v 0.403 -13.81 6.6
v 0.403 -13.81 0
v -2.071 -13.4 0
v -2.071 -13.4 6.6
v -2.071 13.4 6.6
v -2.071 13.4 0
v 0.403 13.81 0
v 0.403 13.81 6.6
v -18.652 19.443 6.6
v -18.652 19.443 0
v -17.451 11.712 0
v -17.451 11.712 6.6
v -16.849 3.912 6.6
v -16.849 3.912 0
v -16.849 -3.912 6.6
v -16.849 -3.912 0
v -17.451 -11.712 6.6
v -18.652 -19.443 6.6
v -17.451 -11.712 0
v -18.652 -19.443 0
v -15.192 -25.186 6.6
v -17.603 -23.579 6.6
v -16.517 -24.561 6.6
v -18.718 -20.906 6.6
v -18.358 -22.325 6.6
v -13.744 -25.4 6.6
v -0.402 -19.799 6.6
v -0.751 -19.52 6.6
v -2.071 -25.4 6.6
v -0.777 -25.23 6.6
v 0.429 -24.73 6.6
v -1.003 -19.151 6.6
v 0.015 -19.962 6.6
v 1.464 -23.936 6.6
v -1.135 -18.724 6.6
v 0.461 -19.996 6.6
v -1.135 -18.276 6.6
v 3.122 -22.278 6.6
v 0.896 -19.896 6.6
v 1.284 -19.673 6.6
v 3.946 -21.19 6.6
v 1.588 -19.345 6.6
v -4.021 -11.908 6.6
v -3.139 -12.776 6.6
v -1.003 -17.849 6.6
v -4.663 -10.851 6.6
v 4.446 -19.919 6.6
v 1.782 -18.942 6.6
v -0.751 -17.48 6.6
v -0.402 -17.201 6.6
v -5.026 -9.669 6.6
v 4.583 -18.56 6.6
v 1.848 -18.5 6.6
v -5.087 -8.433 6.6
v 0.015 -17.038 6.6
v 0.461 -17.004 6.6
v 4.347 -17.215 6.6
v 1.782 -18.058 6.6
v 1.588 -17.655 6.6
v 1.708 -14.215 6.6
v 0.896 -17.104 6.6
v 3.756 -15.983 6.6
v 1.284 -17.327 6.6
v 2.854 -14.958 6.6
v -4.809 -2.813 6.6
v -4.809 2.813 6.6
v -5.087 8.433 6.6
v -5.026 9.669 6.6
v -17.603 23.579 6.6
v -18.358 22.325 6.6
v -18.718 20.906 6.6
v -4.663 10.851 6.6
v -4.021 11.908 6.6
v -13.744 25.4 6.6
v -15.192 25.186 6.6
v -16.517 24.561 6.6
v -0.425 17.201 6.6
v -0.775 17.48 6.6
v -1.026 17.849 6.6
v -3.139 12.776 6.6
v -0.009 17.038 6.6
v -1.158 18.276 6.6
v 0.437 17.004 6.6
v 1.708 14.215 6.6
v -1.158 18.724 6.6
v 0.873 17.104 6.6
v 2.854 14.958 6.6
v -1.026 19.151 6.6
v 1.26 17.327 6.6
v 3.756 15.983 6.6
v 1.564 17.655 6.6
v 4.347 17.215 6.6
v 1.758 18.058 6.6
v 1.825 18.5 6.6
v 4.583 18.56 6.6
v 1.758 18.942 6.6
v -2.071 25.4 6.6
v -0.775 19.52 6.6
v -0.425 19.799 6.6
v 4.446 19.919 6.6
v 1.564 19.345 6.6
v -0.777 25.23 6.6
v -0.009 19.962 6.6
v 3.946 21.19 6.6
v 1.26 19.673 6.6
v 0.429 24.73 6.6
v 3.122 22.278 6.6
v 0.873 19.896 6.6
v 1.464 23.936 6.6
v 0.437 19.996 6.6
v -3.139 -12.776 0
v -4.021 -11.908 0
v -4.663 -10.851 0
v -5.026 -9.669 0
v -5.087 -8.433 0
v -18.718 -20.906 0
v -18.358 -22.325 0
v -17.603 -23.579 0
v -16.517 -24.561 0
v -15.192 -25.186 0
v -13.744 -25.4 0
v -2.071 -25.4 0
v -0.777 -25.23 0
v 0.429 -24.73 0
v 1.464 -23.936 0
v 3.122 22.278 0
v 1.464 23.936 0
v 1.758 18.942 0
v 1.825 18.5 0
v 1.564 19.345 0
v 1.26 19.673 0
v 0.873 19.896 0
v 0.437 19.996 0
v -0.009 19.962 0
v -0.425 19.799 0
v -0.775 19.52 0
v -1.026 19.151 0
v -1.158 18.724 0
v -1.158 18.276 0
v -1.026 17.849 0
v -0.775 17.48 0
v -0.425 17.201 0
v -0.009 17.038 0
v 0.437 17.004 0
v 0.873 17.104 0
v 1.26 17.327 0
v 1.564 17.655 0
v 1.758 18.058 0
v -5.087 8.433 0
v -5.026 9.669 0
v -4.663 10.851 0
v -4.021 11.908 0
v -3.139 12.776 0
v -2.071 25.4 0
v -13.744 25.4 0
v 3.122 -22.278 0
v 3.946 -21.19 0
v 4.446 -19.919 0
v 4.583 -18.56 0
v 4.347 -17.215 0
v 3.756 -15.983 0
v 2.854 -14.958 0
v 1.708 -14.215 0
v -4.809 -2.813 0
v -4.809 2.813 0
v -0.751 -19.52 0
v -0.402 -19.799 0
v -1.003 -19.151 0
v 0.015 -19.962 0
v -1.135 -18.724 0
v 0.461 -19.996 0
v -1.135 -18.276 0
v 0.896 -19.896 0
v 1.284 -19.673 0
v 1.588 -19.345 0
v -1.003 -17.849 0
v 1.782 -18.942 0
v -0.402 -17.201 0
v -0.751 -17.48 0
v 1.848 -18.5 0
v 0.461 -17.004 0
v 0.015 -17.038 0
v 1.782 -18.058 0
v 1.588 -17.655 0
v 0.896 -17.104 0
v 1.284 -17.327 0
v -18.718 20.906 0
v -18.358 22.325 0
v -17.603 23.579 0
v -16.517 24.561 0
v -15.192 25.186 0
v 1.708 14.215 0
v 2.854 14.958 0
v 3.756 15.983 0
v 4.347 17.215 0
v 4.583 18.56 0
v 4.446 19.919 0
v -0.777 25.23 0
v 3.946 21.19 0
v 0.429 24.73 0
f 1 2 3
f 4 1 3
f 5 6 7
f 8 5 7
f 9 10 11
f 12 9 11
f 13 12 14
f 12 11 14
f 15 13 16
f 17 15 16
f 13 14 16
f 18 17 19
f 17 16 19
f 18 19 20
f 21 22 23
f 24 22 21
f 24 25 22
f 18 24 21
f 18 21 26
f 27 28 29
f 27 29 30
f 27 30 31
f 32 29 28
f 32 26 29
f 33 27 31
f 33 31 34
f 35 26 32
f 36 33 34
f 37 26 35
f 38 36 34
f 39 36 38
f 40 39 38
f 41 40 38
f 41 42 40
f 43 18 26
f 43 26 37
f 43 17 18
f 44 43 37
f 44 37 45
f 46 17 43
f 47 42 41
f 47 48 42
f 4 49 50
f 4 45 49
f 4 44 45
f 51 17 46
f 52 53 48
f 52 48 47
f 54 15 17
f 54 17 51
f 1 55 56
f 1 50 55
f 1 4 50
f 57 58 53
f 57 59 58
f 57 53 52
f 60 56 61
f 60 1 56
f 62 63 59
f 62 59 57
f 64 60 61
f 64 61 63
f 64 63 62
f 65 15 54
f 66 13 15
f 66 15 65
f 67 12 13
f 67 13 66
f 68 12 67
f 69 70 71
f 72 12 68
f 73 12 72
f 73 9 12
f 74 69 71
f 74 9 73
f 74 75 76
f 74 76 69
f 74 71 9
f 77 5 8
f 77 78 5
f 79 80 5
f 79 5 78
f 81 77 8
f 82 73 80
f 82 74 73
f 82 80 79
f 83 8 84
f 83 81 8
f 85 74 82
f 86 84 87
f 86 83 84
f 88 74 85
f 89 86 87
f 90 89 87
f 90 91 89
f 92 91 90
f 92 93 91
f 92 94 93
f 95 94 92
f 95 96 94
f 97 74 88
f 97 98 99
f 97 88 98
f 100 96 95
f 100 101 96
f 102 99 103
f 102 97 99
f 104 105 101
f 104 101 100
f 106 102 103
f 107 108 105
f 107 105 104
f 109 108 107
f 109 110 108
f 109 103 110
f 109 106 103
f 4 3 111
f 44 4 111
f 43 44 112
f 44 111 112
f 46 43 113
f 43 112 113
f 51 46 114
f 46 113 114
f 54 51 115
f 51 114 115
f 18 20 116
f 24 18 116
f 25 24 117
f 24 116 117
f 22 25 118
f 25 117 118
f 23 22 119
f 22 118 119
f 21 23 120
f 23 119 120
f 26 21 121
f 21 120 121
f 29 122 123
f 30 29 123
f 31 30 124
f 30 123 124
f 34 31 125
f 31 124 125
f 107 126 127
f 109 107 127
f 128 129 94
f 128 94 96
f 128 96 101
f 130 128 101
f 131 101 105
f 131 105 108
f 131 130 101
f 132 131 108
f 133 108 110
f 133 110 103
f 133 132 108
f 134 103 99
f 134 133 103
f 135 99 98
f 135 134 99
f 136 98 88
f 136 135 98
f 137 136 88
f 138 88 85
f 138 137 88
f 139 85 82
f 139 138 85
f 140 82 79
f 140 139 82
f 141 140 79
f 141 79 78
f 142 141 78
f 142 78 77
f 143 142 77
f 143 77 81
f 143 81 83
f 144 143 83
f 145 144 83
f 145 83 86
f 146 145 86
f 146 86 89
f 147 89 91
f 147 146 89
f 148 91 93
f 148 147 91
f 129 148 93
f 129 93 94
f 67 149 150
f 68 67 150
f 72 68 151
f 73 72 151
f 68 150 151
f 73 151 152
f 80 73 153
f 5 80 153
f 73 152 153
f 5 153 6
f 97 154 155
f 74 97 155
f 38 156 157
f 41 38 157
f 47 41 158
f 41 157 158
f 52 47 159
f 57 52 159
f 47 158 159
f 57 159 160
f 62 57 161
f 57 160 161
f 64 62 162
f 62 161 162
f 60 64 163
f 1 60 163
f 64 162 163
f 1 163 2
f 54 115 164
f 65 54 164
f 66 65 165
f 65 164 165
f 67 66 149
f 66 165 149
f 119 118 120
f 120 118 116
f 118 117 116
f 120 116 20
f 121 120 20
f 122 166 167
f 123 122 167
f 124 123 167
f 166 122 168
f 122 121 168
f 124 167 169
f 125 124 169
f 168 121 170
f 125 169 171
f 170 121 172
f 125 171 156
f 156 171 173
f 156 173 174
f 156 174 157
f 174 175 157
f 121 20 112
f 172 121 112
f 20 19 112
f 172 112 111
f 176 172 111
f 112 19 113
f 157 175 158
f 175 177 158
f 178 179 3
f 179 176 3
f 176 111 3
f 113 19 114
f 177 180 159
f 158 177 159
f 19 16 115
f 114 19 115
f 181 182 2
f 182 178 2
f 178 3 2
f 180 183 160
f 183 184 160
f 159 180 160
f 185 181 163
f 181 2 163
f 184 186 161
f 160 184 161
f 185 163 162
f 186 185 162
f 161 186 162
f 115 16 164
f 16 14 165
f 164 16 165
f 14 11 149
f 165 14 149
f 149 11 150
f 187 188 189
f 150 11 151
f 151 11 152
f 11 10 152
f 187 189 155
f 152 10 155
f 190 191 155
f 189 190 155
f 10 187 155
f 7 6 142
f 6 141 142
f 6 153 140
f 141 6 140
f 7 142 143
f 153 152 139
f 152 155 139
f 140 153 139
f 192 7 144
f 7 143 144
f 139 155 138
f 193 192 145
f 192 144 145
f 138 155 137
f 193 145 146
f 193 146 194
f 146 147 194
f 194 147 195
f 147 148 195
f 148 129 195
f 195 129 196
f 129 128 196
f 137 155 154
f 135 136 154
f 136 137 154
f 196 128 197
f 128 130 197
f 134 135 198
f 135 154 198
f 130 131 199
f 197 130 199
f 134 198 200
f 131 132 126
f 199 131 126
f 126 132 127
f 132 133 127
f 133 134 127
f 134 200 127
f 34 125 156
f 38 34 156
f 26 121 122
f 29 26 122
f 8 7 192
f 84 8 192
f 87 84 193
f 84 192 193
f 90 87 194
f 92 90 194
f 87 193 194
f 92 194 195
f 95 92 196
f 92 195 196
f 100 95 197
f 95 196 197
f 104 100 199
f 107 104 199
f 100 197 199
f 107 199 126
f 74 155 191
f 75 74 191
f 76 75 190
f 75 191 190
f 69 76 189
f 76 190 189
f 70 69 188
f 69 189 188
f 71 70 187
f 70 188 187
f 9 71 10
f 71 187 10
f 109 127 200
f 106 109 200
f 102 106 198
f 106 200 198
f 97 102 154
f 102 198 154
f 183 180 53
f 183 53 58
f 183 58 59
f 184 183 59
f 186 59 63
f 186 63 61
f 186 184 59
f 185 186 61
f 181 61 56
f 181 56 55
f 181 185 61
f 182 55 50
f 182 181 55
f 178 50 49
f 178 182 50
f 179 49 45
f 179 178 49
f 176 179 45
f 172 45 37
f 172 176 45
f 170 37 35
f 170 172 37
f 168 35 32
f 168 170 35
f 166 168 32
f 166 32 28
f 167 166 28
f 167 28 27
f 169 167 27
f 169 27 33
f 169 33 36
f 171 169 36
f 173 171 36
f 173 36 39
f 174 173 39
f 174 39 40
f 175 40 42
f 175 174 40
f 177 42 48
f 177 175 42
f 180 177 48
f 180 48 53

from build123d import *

# Parameters (mm, degrees)
MODEL_R             = 1.5
BOSS_EXTRUDE1_DEPTH = 6.6


with BuildPart() as part:
    # Model → Boss-Extrude1 (new body)
    with BuildSketch(Plane.XY):
        with BuildLine():
            Line((0.403470192, -13.809994881), (-2.071067812, -13.4))
            ThreePointArc((-2.071067812, -13.4), (-4.374720312, -11.399768226), (-5.087238474, -8.433278742))
            ThreePointArc((-5.087238474, -8.433278742), (-4.773776994, 0), (-5.087238474, 8.433278742))
            ThreePointArc((-5.087238474, 8.433278742), (-4.374720312, 11.399768226), (-2.071067812, 13.4))
            Line((-2.071067812, 13.4), (0.403470192, 13.809994881))
            ThreePointArc((0.403470192, 13.809994881), (4.346933521, 17.214586867), (3.121718942, 22.278281058))
            Line((3.121718942, 22.278281058), (1.464466094, 23.935533906))
            ThreePointArc((1.464466094, 23.935533906), (-0.15765065, 25.019397663), (-2.071067812, 25.4))
            Line((-2.071067812, 25.4), (-13.74395333, 25.4))
            ThreePointArc((-13.74395333, 25.4), (-17.602984306, 23.579289217), (-18.651543558, 19.44315197))
            ThreePointArc((-18.651543558, 19.44315197), (-16.773776994, 0), (-18.651543558, -19.44315197))
            ThreePointArc((-18.651543558, -19.44315197), (-17.602984306, -23.579289217), (-13.74395333, -25.4))
            Line((-13.74395333, -25.4), (-2.071067812, -25.4))
            ThreePointArc((-2.071067812, -25.4), (-0.15765065, -25.019397663), (1.464466094, -23.935533906))
            Line((1.464466094, -23.935533906), (3.121718942, -22.278281058))
            ThreePointArc((3.121718942, -22.278281058), (4.346933521, -17.214586867), (0.403470192, -13.809994881))
        make_face()
        with Locations((0.325033172, 18.5)):
            Circle(MODEL_R, mode=Mode.SUBTRACT)
        with Locations((0.348456442, -18.5)):
            Circle(MODEL_R, mode=Mode.SUBTRACT)
    extrude(amount=BOSS_EXTRUDE1_DEPTH)


solid = part.part
